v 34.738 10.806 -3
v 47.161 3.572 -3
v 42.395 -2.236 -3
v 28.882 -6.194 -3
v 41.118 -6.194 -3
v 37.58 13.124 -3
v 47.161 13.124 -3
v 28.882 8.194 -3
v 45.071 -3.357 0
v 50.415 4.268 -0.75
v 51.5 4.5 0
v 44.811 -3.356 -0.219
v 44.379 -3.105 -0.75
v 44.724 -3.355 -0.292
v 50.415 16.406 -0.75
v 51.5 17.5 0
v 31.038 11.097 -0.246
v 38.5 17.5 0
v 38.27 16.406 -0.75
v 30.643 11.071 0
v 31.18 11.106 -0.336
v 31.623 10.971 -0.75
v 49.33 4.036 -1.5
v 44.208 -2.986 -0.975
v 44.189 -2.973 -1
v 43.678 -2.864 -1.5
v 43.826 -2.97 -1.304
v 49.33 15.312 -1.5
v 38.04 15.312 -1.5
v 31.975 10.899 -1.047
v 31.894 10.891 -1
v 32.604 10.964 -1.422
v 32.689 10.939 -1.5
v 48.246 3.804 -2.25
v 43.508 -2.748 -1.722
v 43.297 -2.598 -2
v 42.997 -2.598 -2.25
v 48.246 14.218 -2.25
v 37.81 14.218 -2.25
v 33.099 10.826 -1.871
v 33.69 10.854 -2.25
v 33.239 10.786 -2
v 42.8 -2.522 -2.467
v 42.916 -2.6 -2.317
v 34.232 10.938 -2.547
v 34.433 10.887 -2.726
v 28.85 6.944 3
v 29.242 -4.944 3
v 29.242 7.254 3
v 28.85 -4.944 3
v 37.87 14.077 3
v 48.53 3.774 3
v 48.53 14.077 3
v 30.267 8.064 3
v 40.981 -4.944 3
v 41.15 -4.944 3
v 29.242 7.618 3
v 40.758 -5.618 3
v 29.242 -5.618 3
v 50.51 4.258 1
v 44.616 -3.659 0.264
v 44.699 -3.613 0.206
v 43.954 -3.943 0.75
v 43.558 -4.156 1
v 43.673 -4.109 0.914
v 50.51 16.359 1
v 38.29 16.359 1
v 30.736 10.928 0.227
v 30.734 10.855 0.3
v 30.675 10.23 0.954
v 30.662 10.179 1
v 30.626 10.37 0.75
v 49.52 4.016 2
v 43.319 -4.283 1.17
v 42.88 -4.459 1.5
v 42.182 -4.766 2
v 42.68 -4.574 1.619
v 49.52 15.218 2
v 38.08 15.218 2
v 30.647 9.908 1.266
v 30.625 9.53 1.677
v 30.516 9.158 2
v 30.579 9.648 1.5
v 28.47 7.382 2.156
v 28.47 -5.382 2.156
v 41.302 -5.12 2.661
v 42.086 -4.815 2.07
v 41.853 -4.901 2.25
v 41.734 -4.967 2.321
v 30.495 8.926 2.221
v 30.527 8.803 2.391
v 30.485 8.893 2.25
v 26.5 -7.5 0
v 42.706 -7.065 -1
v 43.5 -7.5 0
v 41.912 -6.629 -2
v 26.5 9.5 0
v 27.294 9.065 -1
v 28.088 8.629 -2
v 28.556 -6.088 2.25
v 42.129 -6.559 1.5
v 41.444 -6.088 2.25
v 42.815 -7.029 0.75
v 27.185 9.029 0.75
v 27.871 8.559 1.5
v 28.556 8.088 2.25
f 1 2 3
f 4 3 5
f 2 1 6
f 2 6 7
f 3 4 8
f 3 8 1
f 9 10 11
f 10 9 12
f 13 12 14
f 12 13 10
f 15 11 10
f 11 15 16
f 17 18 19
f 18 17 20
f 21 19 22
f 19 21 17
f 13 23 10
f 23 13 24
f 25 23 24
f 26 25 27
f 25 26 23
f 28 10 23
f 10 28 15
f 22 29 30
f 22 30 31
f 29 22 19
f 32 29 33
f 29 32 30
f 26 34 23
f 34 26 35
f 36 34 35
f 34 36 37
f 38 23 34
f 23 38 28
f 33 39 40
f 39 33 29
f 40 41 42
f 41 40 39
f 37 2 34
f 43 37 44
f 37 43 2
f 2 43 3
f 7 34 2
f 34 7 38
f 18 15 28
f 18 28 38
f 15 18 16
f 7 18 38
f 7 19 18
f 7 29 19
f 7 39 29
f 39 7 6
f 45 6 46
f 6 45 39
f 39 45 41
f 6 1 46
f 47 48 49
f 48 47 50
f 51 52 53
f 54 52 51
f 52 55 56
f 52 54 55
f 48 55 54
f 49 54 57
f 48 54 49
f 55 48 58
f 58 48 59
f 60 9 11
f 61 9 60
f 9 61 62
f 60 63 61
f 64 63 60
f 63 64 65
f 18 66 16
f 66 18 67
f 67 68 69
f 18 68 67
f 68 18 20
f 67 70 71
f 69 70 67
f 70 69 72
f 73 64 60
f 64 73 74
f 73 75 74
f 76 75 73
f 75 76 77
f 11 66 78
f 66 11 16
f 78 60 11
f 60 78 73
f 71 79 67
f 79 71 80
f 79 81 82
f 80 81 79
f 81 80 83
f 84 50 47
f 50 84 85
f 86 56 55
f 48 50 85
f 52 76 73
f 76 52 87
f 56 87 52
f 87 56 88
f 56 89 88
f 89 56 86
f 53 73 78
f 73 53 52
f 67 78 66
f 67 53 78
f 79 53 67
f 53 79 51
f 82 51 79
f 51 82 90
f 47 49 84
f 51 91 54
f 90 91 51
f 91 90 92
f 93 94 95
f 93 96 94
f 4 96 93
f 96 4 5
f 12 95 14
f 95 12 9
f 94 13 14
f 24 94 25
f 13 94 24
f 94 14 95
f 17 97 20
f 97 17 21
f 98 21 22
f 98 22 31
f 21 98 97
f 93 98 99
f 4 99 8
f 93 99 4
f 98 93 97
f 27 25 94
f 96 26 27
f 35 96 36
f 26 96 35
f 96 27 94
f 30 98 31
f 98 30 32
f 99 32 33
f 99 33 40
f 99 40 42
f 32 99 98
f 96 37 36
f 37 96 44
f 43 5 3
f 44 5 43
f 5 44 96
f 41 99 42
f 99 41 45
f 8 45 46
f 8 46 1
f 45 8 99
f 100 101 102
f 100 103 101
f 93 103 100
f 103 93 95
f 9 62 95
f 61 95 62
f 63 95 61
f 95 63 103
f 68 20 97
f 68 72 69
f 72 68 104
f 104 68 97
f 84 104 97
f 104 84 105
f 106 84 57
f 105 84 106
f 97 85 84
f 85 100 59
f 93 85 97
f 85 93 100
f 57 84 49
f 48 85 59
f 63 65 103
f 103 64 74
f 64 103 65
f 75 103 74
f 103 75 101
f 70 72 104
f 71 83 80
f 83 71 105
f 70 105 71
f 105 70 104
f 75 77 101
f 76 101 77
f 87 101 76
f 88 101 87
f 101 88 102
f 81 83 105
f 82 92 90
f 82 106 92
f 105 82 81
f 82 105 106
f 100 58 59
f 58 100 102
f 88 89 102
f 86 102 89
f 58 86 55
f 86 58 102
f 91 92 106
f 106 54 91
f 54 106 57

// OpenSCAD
// How many parts do you want??
numberOfParts= 1; // [1:20]


//!OpenSCAD
module aember(x,y) {
   translate([x,y]){ 
        mirror([0,0,1]){
          linear_extrude( height=height, twist=0, scale=[scale1, scale2], center=false){
            hull(){
              square([square1, square1], center=true);
              translate([translate2, translate2, 0]){
                square([square2, square2], center=true);
              }
            }
          }
        }
        linear_extrude( height=height, twist=0, scale=[scale3, scale4], center=false){
          hull(){
            square([square1, square1], center=true);
            translate([translate2, translate2, 0]){
              square([square2, square2], center=true);
            }
          }
        }
    }
    square1 = round(rands(6,18,1)[0]);
    square2 = round(rands(6,18,1)[0]);
    height = 3;
    translate2 = round(rands(8,10,1)[0]);
    scale1 = rands(0.65,0.85,1)[0];
    scale2 = rands(0.65,0.85,1)[0];
    scale3 = rands(0.65,0.85,1)[0];
    scale4 = rands(0.65,0.85,1)[0];

}


if(numberOfParts%2==0){
    for(i = [1:(numberOfParts/2)]){
    aember(i*35, 1);
    aember(i*35,1);
    aember(i*35,1);
    for(x = [1:(numberOfParts/2)]){
        aember(i*35, 35);
        aember(i*35, 35);
        aember(i*35,35);
        }
    }
}
else if(numberOfParts!=1){
    for(i = [1:(numberOfParts/2)]){
    aember(i*35, 1);
    aember(i*35,1);
    aember(i*35,1);
    for(x = [1:((numberOfParts/2)+1)]){
        aember(x*35, 35);
        aember(x*35, 35);
        aember(x*35,35);
        }
    }
}
else if(numberOfParts==1){
    aember(35, 1);
    aember(35,1);
    aember(35,1);
}
    
